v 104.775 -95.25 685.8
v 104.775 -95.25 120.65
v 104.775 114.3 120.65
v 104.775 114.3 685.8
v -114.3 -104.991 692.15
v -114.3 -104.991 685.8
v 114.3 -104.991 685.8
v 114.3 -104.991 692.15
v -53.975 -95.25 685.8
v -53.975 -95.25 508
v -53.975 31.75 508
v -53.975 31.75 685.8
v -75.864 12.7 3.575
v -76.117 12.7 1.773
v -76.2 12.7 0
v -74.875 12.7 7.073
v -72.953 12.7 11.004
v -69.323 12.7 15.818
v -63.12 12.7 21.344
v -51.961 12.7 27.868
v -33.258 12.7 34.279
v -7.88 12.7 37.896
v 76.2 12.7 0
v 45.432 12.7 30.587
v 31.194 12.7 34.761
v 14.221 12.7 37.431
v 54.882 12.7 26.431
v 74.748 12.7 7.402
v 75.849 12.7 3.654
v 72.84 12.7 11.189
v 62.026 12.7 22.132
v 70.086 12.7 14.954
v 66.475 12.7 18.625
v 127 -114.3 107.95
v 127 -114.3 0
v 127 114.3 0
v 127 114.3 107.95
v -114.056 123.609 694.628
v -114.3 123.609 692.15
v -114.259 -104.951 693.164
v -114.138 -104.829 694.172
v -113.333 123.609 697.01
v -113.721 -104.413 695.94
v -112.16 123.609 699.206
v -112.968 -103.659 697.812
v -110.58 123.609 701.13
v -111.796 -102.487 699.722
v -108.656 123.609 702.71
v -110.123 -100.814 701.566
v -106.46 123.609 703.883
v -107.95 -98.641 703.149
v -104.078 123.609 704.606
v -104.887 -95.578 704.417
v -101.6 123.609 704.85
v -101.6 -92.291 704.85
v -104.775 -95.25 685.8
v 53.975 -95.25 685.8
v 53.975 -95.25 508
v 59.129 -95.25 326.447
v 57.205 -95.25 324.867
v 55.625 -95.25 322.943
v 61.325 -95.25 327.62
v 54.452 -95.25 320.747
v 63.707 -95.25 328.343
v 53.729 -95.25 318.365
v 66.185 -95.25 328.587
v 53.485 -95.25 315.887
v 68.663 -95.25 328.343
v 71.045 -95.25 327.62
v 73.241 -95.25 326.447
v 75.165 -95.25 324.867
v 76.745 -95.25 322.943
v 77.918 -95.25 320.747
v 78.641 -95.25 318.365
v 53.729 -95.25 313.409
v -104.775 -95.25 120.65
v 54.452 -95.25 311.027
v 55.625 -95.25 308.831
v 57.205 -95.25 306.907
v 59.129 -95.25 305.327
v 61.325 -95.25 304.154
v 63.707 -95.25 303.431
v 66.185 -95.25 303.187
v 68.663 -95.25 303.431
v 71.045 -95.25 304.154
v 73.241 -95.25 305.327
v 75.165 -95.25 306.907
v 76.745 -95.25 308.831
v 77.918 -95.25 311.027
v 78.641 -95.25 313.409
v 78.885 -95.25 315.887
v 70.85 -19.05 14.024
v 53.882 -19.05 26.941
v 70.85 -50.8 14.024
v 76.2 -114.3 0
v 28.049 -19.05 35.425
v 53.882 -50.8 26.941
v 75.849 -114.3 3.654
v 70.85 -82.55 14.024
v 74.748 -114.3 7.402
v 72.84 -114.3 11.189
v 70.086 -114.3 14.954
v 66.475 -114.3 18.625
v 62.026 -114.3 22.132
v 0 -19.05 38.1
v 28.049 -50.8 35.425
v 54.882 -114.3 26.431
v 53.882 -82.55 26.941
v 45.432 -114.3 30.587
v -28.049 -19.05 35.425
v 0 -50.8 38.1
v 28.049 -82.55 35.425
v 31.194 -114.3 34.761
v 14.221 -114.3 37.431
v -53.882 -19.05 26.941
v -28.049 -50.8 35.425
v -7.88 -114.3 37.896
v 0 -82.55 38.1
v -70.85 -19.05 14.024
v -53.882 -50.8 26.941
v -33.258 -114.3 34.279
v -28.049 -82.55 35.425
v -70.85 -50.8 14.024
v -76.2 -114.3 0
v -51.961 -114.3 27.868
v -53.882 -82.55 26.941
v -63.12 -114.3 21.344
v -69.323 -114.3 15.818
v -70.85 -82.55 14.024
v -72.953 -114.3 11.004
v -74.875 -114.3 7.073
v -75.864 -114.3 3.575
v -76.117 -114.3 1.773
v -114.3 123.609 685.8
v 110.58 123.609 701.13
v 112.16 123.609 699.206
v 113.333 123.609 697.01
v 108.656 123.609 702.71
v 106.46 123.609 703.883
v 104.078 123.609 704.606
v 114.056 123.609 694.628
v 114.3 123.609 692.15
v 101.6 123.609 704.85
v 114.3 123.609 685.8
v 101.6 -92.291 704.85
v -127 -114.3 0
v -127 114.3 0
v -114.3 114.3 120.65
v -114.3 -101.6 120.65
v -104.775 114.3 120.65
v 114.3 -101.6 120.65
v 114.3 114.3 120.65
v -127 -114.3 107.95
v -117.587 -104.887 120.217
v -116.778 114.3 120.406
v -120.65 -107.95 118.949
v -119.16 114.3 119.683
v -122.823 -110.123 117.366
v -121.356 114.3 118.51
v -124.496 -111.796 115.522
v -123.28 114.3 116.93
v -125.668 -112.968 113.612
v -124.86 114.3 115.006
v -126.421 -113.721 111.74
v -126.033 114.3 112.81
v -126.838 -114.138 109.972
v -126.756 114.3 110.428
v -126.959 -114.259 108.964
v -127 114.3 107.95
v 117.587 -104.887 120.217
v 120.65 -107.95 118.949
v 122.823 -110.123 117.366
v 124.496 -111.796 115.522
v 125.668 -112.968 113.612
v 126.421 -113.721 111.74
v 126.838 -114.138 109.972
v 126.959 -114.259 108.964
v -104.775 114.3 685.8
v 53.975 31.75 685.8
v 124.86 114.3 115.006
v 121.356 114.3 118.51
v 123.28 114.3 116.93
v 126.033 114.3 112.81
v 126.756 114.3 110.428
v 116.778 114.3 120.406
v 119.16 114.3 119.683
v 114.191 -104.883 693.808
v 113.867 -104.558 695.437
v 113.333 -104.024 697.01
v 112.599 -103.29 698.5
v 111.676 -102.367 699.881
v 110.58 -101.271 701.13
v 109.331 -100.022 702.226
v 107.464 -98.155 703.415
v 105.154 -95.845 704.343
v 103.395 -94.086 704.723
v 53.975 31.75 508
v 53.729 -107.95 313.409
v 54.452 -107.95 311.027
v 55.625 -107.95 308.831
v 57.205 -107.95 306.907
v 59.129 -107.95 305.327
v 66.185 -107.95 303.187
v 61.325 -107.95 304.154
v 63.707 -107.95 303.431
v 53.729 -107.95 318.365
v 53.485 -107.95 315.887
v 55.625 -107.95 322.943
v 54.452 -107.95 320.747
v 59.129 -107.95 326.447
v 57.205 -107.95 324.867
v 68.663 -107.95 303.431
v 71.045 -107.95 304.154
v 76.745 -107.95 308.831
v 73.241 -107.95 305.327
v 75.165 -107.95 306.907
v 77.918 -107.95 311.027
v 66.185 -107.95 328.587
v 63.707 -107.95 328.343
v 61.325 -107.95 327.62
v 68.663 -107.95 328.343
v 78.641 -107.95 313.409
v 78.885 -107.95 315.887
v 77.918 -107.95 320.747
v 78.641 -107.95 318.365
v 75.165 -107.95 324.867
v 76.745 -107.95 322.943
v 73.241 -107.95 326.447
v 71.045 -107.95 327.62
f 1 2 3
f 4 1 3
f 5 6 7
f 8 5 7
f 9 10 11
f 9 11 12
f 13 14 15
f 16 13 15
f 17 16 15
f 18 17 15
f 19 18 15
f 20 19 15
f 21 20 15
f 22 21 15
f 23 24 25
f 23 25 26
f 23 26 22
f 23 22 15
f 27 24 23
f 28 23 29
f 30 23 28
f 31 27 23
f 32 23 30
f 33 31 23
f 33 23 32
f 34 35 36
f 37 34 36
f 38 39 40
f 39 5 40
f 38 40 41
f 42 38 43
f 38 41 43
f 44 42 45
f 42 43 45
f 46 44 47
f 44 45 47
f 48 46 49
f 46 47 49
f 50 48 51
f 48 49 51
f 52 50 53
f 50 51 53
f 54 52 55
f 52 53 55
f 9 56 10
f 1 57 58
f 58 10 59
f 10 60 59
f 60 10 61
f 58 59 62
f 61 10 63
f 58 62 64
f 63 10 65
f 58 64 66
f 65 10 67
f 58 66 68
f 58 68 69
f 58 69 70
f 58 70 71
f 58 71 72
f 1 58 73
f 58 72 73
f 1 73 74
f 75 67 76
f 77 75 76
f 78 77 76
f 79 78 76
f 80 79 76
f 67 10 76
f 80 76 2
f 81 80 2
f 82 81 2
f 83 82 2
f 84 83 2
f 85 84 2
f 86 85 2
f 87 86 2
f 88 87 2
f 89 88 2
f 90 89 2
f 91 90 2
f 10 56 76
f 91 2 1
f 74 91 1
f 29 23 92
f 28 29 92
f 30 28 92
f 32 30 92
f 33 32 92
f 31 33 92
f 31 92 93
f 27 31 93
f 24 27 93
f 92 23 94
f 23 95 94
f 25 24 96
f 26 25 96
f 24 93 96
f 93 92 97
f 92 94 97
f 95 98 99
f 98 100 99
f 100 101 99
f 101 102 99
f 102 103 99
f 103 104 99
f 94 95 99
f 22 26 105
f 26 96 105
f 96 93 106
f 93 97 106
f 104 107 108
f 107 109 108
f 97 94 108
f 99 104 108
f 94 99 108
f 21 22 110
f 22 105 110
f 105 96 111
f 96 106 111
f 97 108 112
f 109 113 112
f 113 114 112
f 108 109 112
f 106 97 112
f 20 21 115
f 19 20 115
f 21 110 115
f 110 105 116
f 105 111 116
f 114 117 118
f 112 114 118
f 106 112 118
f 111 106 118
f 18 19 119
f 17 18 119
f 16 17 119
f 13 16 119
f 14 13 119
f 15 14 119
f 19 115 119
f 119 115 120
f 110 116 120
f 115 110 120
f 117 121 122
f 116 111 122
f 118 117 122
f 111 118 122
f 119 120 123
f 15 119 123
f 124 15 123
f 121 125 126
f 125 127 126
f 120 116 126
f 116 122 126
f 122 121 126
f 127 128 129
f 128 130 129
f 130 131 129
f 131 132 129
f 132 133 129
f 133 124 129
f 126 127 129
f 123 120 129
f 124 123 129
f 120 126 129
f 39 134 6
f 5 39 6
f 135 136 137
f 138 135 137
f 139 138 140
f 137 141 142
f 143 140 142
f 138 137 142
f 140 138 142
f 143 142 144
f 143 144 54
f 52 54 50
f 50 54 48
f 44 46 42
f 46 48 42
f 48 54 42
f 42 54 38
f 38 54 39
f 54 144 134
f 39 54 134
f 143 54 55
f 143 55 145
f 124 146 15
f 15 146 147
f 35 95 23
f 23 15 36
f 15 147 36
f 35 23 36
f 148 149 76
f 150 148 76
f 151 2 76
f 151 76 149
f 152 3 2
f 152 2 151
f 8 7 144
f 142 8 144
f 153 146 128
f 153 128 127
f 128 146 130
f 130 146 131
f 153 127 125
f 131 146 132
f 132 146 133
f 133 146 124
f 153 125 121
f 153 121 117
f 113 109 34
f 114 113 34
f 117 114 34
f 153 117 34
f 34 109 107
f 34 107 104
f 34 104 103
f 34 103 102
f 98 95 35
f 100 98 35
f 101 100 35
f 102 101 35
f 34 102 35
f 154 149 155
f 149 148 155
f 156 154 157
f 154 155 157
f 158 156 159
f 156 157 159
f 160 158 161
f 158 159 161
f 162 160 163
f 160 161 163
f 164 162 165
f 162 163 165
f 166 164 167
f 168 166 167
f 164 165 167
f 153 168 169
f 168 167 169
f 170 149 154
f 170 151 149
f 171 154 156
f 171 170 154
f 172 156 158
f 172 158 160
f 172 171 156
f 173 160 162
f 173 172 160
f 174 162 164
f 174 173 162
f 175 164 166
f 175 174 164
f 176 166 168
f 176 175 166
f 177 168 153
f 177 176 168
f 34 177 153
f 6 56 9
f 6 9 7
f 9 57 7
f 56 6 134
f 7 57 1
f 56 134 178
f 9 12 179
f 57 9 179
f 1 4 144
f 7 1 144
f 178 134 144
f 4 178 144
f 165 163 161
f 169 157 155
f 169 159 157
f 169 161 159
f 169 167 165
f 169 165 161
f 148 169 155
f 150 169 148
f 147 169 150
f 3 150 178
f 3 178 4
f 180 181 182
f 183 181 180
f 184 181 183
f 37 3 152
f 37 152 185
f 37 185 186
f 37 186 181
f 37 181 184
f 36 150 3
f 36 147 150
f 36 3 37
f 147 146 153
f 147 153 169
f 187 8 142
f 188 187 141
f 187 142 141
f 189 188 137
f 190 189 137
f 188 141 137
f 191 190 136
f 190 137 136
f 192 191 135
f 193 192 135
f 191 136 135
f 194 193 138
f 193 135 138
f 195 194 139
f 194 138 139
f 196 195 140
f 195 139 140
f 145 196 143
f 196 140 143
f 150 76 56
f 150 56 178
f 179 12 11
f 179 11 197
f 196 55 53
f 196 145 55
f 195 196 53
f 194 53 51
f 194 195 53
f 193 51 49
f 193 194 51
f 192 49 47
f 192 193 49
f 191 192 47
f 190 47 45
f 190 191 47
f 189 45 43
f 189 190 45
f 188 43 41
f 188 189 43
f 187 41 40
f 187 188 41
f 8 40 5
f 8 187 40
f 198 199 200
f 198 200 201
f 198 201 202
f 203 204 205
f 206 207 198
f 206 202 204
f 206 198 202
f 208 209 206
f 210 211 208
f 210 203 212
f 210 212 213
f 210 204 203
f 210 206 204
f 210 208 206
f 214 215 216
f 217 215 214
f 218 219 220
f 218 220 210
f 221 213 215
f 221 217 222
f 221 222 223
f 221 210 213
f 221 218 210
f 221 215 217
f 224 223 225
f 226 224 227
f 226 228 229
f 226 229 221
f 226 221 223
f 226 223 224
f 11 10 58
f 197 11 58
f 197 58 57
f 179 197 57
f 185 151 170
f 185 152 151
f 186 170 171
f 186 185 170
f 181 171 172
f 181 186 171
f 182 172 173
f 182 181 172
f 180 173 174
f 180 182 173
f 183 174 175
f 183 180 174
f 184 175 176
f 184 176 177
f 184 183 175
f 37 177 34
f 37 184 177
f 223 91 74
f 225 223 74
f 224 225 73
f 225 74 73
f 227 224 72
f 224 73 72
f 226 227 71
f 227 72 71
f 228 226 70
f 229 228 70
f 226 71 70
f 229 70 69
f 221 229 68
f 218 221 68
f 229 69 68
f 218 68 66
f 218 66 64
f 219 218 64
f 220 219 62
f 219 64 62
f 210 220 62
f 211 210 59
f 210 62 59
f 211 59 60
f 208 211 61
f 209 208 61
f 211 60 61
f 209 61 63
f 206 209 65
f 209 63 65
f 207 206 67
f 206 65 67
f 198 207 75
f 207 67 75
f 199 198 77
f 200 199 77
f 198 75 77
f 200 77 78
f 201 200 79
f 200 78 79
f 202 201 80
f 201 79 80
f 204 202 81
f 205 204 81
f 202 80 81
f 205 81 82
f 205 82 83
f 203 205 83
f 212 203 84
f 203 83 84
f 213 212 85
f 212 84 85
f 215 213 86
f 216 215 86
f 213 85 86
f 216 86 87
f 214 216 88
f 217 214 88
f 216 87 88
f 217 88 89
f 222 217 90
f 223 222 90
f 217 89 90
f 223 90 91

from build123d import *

# Parameters (mm, degrees)
F0_W      = 254
F0_H      = 228.6
F1_DEPTH  = 120.65
F2_W      = 209.55
F2_H      = 209.55
F3_DEPTH  = 565.15
F5_DEPTH  = 19.05
F6_W      = 107.95
F6_H      = 177.8
F7_DEPTH  = 127
F8_R      = 12.7
F9_DEPTH  = 12.7
F10_R     = 12.7
F12_DEPTH = 127


with BuildPart() as f1:
    # F0 (on Top) → F1 (new body)
    with BuildSketch(Plane.XY):
        Rectangle(F0_W, F0_H)
    extrude(amount=F1_DEPTH)

    # F2 (on face) → F3 (join)
    with BuildSketch(Plane.XY.offset(120.65)):
        with Locations((0, 9.525)):
            Rectangle(F2_W, F2_H)
    extrude(amount=F3_DEPTH)

    # F4 (on face) → F5 (join)
    with BuildSketch(Plane.XY.offset(685.8)):
        Polygon((114.3, 123.608778), (-114.3, 123.608778), (-114.3, -104.991222), (0, -104.991222), (114.3, -104.991222), align=None)
        Polygon((104.775, -95.25), (0, -95.25), (-104.775, -95.25), (-104.775, 114.3), (104.775, 114.3), align=None, mode=Mode.SUBTRACT)
        Polygon((-104.775, -95.25), (0, -95.25), (104.775, -95.25), (104.775, 114.3), (-104.775, 114.3), align=None)
    extrude(amount=F5_DEPTH)

    # F6 (on face) → F7 (cut)
    with BuildSketch(Plane.XZ.offset(95.25)):
        with Locations((0, 596.9)):
            Rectangle(F6_W, F6_H)
    extrude(amount=-F7_DEPTH, mode=Mode.SUBTRACT)

    # F8 (on face) → F9 (join)
    with BuildSketch(Plane.XZ.offset(95.25)):
        with Locations((66.185057, 315.886974)):
            Circle(F8_R)
    extrude(amount=F9_DEPTH)

    # F10
    f10_edges = [f1.edges().sort_by_distance(p)[0] for p in [
        (127, 0, 120.65),
        (0, -114.3, 120.65),
        (-127, 0, 120.65),
        (114.3, 9.308778, 704.85),
        (0, -104.991222, 704.85),
        (-114.3, 9.308778, 704.85),
    ]]
    fillet(f10_edges, radius=F10_R)

    # F11 (on face) → F12 (cut)
    with BuildSketch(Plane.XZ.offset(114.3)):
        with BuildLine():
            add(Edge.make_bspline(
                [(-76.2, 0), (-76.2, -38.1), (0, -38.1), (76.2, -38.1), (76.2, 0)],
                knots=[3.141593, 3.141593, 3.141593, 4.712389, 4.712389, 6.283185, 6.283185, 6.283185], degree=2, weights=[1, 0.707107, 1, 0.707107, 1]))
            Line((76.2, 0), (-76.2, 0))
        make_face()
        with BuildLine():
            Line((-76.2, 0), (76.2, 0))
            add(Edge.make_bspline(
                [(76.2, 0), (76.2, 38.1), (0, 38.1), (-76.2, 38.1), (-76.2, 0)],
                knots=[0, 0, 0, 1.570796, 1.570796, 3.141593, 3.141593, 3.141593], degree=2, weights=[1, 0.707107, 1, 0.707107, 1]))
        make_face()
    extrude(amount=-F12_DEPTH, mode=Mode.SUBTRACT)


solid = f1.part
